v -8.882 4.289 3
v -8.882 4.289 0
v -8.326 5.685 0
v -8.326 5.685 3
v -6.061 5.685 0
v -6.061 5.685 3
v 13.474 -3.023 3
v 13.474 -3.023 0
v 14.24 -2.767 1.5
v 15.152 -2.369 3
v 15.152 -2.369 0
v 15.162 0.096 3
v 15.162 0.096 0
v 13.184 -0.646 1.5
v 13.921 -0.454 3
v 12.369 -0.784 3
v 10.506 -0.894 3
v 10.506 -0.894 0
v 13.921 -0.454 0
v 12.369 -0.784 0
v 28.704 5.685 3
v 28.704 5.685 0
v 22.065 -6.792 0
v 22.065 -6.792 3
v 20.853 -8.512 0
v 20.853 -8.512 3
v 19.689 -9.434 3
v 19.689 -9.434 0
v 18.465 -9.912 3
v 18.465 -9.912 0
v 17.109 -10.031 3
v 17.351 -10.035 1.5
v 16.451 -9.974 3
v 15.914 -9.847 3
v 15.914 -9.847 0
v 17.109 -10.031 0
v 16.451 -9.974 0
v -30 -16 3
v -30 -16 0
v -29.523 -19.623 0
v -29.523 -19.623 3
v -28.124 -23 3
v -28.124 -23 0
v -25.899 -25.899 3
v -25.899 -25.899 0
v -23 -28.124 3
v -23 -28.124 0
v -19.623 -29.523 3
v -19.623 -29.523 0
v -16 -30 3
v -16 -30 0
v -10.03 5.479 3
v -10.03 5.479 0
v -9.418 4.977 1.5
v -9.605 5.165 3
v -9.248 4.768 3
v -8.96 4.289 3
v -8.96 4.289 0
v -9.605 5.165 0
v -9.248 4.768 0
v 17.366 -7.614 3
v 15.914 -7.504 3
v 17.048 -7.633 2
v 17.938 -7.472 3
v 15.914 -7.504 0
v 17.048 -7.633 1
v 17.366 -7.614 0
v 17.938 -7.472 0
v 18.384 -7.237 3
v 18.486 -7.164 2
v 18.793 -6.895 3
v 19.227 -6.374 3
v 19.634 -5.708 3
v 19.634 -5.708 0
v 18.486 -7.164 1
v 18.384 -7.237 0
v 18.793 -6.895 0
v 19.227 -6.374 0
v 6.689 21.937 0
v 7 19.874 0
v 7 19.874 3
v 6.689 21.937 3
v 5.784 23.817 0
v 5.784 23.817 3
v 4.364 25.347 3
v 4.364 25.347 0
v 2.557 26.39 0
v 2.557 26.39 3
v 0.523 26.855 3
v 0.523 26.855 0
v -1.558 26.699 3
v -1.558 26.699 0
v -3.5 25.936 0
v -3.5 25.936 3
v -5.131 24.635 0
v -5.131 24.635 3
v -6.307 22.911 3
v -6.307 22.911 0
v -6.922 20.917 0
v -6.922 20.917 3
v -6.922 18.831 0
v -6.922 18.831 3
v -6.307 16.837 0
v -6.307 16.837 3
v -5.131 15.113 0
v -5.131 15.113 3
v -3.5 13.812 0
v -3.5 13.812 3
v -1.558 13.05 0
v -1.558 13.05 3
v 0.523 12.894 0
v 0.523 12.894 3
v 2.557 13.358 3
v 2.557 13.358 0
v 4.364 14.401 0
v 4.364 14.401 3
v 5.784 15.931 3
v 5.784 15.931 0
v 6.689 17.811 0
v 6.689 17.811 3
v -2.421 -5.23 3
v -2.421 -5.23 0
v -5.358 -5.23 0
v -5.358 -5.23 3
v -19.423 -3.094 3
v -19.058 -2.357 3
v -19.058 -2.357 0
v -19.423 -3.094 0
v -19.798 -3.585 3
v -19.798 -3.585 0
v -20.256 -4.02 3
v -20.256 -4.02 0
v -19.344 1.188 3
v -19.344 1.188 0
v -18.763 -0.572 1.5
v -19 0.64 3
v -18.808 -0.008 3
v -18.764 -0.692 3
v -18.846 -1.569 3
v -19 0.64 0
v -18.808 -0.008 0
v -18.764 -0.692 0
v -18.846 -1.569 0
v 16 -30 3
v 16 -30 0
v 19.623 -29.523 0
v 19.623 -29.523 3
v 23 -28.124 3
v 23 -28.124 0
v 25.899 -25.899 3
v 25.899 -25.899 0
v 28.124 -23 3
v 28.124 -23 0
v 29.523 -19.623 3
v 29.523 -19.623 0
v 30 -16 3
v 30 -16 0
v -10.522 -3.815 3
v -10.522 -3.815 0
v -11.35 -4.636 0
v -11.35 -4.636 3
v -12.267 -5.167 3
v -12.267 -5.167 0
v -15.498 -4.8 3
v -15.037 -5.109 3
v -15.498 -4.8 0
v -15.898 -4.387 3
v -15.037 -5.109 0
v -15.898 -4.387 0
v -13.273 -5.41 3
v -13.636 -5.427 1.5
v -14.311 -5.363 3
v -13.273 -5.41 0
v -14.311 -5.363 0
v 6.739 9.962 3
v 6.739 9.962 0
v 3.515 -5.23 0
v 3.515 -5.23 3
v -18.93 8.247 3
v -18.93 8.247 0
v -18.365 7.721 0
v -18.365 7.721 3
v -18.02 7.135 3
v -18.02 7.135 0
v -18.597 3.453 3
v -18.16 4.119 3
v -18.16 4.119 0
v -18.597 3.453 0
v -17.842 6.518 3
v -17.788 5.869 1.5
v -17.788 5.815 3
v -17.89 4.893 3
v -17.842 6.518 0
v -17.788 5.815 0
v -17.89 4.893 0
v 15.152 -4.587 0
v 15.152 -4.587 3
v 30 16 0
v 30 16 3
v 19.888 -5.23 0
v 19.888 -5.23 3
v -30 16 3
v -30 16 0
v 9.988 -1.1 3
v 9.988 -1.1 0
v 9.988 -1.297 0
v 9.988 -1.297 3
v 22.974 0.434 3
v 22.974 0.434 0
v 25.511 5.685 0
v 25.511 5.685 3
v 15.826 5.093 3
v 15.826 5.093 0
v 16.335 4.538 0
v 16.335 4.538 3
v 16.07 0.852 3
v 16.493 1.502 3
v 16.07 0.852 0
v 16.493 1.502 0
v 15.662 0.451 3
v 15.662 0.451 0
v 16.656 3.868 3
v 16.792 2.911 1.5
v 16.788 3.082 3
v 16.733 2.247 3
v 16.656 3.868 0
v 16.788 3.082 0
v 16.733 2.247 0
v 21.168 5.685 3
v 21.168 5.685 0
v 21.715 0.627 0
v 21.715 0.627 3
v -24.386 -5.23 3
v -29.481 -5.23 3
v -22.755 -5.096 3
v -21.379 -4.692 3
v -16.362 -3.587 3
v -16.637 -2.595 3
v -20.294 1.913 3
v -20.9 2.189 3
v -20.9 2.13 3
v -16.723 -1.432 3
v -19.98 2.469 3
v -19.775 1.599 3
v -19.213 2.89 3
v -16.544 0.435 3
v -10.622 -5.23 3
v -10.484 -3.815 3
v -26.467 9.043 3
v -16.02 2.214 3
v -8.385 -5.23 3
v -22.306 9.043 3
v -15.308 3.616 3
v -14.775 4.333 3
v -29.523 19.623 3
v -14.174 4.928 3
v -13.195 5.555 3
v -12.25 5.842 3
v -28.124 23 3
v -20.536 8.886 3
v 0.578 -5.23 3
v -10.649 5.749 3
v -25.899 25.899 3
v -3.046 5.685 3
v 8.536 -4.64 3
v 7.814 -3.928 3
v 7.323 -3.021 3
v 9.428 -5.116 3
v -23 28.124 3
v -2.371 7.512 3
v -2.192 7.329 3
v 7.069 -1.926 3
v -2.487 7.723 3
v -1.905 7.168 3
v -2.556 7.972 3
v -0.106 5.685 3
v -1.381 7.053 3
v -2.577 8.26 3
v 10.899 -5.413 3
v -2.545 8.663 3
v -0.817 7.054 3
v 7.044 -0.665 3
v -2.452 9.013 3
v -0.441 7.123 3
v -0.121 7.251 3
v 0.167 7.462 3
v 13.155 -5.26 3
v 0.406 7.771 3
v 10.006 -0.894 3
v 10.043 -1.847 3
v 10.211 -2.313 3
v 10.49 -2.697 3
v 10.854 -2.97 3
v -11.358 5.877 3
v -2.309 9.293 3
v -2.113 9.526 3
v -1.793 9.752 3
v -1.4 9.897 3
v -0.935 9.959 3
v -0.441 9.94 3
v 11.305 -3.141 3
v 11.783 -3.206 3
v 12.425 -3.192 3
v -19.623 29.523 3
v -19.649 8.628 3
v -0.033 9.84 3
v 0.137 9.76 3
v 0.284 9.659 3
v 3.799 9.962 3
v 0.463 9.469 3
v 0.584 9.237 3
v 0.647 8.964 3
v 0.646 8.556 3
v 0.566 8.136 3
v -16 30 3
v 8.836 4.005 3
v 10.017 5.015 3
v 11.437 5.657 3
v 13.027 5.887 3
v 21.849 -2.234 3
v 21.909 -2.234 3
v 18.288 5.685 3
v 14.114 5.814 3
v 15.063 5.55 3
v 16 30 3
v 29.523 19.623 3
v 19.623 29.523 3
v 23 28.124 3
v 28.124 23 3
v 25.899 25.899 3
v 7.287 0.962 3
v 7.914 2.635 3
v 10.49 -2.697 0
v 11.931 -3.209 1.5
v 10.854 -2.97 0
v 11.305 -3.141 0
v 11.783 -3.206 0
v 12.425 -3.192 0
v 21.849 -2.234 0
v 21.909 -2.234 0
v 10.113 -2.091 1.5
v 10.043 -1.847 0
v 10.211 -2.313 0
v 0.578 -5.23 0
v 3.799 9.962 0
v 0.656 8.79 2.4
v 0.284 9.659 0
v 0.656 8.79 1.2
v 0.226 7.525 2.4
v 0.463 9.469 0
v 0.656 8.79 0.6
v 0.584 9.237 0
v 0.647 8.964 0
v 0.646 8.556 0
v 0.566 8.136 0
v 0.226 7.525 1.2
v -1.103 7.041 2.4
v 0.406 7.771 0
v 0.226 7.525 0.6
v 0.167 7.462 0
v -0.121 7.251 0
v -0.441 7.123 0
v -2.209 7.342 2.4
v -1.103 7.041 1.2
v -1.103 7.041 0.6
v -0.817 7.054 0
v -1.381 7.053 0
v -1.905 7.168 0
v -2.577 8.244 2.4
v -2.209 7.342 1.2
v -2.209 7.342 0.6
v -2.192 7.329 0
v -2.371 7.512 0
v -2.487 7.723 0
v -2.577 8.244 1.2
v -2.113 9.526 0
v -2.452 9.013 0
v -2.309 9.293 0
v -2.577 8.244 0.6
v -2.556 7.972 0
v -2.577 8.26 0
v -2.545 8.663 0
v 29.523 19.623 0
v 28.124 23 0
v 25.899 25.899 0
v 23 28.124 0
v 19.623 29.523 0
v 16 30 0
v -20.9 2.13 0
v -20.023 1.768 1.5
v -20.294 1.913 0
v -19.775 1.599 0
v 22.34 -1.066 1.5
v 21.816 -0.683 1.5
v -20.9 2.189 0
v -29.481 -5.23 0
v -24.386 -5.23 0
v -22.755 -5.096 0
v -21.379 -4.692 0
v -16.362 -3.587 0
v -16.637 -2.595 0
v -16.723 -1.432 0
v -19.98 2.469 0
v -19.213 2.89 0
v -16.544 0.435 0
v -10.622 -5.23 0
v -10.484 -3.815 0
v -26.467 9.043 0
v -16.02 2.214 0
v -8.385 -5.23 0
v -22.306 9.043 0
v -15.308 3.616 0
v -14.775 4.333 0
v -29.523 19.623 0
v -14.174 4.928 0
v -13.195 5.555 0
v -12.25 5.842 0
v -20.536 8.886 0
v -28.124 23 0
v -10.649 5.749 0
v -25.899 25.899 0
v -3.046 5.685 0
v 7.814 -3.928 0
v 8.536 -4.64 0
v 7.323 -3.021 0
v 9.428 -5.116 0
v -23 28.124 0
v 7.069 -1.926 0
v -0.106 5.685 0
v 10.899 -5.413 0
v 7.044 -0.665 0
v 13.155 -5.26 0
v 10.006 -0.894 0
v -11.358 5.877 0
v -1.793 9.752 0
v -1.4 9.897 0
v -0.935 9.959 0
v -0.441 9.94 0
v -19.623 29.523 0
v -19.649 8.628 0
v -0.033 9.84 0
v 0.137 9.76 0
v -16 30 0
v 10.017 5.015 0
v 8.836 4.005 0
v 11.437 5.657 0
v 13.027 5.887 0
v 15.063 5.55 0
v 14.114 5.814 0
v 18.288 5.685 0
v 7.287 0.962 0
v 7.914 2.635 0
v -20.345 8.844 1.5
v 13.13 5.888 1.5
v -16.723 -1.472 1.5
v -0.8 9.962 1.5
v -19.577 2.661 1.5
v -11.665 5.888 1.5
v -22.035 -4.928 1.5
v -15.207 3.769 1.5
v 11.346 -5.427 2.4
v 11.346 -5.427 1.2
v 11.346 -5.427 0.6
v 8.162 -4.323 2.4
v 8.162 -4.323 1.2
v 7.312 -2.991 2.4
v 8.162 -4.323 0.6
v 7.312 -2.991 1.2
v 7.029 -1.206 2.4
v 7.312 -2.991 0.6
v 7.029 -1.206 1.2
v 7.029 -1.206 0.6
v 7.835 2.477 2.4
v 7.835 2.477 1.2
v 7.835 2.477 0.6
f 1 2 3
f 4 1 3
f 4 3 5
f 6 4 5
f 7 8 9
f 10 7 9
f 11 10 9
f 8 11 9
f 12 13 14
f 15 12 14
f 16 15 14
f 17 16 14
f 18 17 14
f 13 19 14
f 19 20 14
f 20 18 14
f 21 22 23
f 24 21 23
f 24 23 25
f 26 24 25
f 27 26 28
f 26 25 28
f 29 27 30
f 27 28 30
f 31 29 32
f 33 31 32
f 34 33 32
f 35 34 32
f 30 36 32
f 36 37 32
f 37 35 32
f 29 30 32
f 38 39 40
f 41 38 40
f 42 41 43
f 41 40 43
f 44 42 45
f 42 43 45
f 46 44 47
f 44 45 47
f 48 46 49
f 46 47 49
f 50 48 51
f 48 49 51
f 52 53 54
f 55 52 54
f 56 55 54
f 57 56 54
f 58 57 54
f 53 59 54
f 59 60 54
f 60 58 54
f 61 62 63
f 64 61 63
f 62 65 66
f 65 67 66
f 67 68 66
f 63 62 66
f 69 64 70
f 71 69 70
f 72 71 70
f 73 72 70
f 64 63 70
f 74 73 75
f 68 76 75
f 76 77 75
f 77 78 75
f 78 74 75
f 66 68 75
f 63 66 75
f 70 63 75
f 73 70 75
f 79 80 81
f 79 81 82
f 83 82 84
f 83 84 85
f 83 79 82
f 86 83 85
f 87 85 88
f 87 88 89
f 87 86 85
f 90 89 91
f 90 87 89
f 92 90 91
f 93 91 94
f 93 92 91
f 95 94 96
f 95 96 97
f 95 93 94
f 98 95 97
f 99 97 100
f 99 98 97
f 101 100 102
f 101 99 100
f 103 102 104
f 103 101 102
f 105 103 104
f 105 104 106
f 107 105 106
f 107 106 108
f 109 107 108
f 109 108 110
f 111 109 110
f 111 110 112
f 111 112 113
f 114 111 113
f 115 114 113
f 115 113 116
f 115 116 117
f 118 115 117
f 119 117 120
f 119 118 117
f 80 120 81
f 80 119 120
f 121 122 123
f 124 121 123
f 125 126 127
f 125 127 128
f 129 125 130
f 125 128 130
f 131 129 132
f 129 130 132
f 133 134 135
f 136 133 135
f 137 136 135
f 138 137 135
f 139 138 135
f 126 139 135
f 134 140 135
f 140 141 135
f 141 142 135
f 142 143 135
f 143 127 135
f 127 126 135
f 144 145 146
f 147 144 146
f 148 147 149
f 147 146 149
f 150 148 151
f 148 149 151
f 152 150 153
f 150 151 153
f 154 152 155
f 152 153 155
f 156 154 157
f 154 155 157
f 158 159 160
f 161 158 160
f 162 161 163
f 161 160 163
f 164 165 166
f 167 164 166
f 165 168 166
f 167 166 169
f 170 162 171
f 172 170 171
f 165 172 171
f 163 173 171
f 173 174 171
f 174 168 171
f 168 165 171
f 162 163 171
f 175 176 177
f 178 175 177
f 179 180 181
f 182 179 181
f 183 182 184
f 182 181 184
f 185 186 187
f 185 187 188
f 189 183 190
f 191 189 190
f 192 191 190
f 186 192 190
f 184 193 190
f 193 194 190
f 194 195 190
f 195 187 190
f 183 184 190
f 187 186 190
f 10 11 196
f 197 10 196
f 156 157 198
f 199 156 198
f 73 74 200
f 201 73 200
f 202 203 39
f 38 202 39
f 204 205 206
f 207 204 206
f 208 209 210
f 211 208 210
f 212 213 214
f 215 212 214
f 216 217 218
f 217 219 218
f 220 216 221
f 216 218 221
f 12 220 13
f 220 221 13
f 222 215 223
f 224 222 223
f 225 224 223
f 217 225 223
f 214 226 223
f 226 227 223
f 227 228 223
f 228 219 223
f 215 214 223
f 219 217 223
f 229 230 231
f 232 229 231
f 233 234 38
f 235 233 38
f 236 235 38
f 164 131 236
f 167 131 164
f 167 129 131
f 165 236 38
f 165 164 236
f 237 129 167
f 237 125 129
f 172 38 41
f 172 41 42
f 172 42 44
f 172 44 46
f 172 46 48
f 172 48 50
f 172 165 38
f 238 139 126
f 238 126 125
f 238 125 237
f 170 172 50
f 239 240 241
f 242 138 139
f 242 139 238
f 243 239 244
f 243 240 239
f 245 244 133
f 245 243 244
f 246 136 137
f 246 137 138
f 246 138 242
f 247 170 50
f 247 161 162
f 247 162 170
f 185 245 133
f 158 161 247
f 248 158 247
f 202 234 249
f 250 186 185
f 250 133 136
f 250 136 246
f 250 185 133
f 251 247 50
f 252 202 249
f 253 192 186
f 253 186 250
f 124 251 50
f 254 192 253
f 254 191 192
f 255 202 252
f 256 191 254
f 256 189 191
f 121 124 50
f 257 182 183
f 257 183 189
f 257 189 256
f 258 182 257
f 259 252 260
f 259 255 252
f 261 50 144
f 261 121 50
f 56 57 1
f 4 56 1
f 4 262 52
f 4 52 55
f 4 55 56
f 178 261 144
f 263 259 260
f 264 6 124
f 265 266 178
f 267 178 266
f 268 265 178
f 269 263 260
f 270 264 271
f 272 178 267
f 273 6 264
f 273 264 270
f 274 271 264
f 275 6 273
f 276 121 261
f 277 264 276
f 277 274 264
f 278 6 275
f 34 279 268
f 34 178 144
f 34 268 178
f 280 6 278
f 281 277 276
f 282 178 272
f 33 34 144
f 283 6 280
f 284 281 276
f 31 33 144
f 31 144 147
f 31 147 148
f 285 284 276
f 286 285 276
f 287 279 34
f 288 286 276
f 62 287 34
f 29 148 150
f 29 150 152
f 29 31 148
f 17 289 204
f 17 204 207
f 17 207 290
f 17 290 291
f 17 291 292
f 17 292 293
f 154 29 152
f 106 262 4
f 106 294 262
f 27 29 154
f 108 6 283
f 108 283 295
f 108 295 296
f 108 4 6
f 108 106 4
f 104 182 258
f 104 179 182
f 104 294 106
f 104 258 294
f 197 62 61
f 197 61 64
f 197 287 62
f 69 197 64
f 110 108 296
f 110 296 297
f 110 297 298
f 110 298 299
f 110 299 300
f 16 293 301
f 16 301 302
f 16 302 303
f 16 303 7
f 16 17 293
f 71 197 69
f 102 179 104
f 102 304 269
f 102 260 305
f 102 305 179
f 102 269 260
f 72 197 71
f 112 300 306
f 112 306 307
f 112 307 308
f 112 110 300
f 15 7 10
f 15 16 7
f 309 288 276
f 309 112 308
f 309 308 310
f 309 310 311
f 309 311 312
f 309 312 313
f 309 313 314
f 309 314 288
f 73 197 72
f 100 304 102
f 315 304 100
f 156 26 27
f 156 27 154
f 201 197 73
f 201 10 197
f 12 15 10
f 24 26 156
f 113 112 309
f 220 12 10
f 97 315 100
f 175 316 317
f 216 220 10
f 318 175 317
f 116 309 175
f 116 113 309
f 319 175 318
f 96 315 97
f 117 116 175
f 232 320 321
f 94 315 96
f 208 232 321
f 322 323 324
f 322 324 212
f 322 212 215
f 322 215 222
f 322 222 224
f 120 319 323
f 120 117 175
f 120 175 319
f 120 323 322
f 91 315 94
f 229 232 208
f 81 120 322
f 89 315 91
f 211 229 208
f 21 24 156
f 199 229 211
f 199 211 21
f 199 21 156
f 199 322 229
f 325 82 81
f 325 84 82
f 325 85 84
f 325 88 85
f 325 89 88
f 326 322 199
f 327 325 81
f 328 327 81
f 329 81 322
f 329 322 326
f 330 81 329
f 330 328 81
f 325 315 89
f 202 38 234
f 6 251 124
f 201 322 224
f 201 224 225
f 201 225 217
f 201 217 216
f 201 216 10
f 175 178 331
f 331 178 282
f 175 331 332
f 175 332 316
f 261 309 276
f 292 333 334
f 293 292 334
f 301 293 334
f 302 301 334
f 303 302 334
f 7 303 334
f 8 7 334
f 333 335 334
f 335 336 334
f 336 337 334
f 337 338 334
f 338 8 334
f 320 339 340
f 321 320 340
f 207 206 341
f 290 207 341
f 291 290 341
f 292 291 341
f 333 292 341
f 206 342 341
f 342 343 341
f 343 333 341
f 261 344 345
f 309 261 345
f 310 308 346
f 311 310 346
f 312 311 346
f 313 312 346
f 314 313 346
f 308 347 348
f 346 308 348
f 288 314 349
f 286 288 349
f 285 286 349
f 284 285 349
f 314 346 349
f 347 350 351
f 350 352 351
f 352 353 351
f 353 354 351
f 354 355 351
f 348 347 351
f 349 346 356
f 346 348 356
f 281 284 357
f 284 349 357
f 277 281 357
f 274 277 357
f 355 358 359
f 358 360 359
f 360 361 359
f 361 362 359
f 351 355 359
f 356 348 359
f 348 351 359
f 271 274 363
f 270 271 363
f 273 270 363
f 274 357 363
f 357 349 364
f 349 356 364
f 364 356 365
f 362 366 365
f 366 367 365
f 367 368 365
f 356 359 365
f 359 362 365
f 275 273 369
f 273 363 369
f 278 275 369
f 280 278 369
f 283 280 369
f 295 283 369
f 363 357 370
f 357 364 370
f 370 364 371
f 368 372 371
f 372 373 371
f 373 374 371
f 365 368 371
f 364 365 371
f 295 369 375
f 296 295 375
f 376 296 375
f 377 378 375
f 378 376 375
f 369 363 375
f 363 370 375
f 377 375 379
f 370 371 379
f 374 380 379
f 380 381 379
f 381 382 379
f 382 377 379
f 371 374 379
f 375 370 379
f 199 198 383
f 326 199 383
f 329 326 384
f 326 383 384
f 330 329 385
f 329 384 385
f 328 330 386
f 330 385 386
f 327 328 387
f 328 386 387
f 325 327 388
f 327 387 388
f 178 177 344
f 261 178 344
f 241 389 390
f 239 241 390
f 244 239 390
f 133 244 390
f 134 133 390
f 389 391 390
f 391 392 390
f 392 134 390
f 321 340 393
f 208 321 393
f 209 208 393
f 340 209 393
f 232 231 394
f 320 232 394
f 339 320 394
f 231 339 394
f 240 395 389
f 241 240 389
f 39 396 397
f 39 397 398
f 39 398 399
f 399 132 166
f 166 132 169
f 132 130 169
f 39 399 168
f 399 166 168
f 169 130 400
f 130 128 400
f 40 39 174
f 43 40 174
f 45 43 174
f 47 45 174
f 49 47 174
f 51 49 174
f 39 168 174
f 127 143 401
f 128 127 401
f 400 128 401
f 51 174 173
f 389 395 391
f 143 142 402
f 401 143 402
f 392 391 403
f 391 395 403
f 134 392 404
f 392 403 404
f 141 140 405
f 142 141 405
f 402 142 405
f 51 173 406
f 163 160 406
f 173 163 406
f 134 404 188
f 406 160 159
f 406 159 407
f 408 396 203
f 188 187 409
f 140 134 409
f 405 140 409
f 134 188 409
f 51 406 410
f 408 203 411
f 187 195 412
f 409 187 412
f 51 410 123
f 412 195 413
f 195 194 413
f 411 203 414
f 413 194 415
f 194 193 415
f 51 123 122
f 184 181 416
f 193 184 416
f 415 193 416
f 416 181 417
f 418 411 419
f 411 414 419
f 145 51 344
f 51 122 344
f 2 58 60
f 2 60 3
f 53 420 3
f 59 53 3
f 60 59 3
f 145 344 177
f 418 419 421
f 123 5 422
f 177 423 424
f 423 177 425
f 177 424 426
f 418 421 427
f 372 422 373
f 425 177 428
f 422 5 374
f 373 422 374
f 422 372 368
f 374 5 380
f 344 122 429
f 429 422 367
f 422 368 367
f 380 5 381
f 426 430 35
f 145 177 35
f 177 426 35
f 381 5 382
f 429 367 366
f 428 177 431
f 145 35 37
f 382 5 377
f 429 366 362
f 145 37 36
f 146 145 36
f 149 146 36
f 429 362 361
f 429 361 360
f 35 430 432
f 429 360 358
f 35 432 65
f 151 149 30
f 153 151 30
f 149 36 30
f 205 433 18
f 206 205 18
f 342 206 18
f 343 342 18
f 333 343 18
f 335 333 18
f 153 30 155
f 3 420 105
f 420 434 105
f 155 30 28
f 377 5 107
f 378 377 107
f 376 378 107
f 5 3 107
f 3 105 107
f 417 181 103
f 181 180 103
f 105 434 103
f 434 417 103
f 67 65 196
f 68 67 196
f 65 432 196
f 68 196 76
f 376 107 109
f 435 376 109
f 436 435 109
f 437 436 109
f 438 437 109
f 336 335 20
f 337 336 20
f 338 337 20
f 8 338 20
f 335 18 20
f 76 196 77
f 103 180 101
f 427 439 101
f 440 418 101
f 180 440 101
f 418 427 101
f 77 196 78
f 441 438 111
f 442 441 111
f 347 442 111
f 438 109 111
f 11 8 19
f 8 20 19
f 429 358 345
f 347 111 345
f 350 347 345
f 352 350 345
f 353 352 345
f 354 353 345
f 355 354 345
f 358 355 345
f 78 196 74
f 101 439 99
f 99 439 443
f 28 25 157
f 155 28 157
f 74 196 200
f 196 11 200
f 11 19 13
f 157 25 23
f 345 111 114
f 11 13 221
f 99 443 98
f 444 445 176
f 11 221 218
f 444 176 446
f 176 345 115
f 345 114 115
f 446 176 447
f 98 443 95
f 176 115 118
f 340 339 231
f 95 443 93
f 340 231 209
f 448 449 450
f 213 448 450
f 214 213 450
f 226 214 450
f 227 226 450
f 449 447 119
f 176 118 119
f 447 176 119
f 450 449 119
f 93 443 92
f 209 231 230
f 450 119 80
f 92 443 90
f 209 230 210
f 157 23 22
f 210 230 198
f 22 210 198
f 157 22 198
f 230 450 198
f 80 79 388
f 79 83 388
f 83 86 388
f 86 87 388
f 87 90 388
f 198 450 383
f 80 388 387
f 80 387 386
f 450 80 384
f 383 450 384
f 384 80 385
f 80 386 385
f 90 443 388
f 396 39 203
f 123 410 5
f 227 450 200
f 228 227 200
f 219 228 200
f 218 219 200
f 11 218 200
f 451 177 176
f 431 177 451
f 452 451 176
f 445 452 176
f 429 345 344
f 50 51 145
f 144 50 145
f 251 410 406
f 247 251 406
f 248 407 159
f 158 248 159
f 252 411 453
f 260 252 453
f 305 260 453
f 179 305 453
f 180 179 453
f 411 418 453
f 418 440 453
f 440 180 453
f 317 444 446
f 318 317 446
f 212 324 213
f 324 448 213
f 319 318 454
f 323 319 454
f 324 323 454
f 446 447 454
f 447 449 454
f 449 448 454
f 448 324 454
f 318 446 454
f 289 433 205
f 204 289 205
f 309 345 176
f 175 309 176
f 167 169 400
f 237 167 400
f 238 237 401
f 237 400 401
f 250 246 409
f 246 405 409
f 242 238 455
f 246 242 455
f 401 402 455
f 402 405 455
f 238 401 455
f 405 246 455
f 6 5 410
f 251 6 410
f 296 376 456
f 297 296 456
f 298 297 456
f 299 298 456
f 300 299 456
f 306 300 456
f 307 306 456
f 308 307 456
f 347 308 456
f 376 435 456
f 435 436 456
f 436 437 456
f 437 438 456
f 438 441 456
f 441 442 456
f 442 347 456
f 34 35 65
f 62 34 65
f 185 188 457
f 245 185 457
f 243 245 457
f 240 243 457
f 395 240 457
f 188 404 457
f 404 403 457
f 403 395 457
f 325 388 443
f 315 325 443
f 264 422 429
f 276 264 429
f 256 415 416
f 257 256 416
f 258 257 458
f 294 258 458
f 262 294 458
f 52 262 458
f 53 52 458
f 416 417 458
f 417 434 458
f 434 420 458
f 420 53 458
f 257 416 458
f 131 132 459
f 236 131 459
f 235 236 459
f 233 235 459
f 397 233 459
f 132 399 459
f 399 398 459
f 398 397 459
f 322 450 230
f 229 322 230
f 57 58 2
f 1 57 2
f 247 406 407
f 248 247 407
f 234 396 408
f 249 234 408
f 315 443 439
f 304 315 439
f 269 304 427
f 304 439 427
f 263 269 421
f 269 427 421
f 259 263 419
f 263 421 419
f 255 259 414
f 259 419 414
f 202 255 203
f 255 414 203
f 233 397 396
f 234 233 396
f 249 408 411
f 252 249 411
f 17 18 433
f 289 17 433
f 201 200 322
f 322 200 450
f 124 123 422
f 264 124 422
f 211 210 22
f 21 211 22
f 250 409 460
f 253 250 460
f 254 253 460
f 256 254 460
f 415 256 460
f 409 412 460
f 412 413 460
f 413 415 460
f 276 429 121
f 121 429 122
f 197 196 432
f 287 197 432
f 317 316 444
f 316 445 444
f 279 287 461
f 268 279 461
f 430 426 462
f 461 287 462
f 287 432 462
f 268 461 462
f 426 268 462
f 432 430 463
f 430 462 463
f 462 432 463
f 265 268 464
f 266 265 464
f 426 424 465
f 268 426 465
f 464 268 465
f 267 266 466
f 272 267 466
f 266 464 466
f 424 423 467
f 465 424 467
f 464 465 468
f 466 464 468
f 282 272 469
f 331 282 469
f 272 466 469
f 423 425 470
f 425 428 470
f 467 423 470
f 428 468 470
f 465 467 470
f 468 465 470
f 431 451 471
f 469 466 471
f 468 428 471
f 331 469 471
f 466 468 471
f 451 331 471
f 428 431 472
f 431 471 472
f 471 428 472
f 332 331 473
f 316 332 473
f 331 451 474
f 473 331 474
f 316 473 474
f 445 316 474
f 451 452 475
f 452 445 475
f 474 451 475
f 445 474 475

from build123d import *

# Parameters (mm, degrees)
F0_R     = 7
F1_DEPTH = 3


with BuildPart() as f1:
    # F0 (on Top) → F1 (new body)
    with BuildSketch(Plane.XY):
        with BuildLine():
            ThreePointArc((30, 16), (25.8994949366, 25.8994949366), (16, 30))
            Line((16, 30), (-16, 30))
            ThreePointArc((-16, 30), (-25.8994949366, 25.8994949366), (-30, 16))
            Line((-30, 16), (-30, -16))
            ThreePointArc((-30, -16), (-25.8994949366, -25.8994949366), (-16, -30))
            Line((-16, -30), (16, -30))
            ThreePointArc((16, -30), (25.8994949366, -25.8994949366), (30, -16))
            Line((30, -16), (30, 16))
        make_face()
        with BuildLine():
            Line((19.8875351453, -5.2301914546), (18.2880349891, 5.685147502))
            Line((18.2880349891, 5.685147502), (21.1683848797, 5.685147502))
            Line((21.1683848797, 5.685147502), (21.7150890347, 0.6273530628))
            add(Edge.make_bspline(
                [(21.7150890347, 0.6273530628), (21.8494220556, -0.5628999831), (21.8494220556, -2.2342526854)],
                knots=[0, 0, 0, 1, 1, 1], degree=2))
            Line((21.8494220556, -2.2342526854), (21.9087785067, -2.2342526854))
            add(Edge.make_bspline(
                [(21.9087785067, -2.2342526854), (22.1055920025, -1.7344088866), (22.3398937832, -1.0658678057)],
                knots=[0, 0, 0, 1, 1, 1], degree=2))
            add(Edge.make_bspline(
                [(22.3398937832, -1.0658678057), (22.5741955639, -0.3973267248), (22.9740706029, 0.4336635907)],
                knots=[0, 0, 0, 1, 1, 1], degree=2))
            Line((22.9740706029, 0.4336635907), (25.5107778819, 5.685147502))
            Line((25.5107778819, 5.685147502), (28.7035301468, 5.685147502))
            Line((28.7035301468, 5.685147502), (22.0649796938, -6.7922033259))
            add(Edge.make_bspline(
                [(22.0649796938, -6.7922033259), (20.3373945642, -10.0349399707), (17.3508278663, -10.0349399707)],
                knots=[0, 0, 0, 1, 1, 1], degree=2))
            add(Edge.make_bspline(
                [(17.3508278663, -10.0349399707), (16.4698531709, -10.0349399707), (15.9137769447, -9.8474985461)],
                knots=[0, 0, 0, 1, 1, 1], degree=2))
            Line((15.9137769447, -9.8474985461), (15.9137769447, -7.5044807392))
            add(Edge.make_bspline(
                [(15.9137769447, -7.5044807392), (16.5791940019, -7.6325657126), (17.0477975633, -7.6325657126)],
                knots=[0, 0, 0, 1, 1, 1], degree=2))
            add(Edge.make_bspline(
                [(17.0477975633, -7.6325657126), (17.8662917838, -7.6325657126), (18.4864104967, -7.1639621512)],
                knots=[0, 0, 0, 1, 1, 1], degree=2))
            add(Edge.make_bspline(
                [(18.4864104967, -7.1639621512), (19.1065292096, -6.6953585898), (19.6344892221, -5.7081670872)],
                knots=[0, 0, 0, 1, 1, 1], degree=2))
            Line((19.6344892221, -5.7081670872), (19.8875351453, -5.2301914546))
        make_face(mode=Mode.SUBTRACT)
        with BuildLine():
            Line((-26.4667291471, 9.0434730253), (-22.305529522, 9.0434730253))
            add(Edge.make_bspline(
                [(-22.305529522, 9.0434730253), (-20.0718525461, 9.0434730253), (-18.9300218682, 8.2468469709)],
                knots=[0, 0, 0, 1, 1, 1], degree=2))
            add(Edge.make_bspline(
                [(-18.9300218682, 8.2468469709), (-17.7881911903, 7.4502209166), (-17.7881911903, 5.8694649028)],
                knots=[0, 0, 0, 1, 1, 1], degree=2))
            add(Edge.make_bspline(
                [(-17.7881911903, 5.8694649028), (-17.7881911903, 4.4042977676), (-18.5973133396, 3.4530325379)],
                knots=[0, 0, 0, 1, 1, 1], degree=2))
            add(Edge.make_bspline(
                [(-18.5973133396, 3.4530325379), (-19.4064354889, 2.5017673083), (-20.8997188379, 2.1893649341)],
                knots=[0, 0, 0, 1, 1, 1], degree=2))
            Line((-20.8997188379, 2.1893649341), (-20.8997188379, 2.130008483))
            add(Edge.make_bspline(
                [(-20.8997188379, 2.130008483), (-19.9250234302, 1.8769625598), (-19.3439550141, 1.1881153246)],
                knots=[0, 0, 0, 1, 1, 1], degree=2))
            add(Edge.make_bspline(
                [(-19.3439550141, 1.1881153246), (-18.7628865979, 0.4992680893), (-18.7628865979, -0.5722720544)],
                knots=[0, 0, 0, 1, 1, 1], degree=2))
            add(Edge.make_bspline(
                [(-18.7628865979, -0.5722720544), (-18.7628865979, -2.8090730541), (-20.2561699469, -4.0196322543)],
                knots=[0, 0, 0, 1, 1, 1], degree=2))
            add(Edge.make_bspline(
                [(-20.2561699469, -4.0196322543), (-21.7494532958, -5.2301914546), (-24.3861293346, -5.2301914546)],
                knots=[0, 0, 0, 1, 1, 1], degree=2))
            Line((-24.3861293346, -5.2301914546), (-29.4814120587, -5.2301914546))
            Line((-29.4814120587, -5.2301914546), (-26.4667291471, 9.0434730253))
        make_face(mode=Mode.SUBTRACT)
        with BuildLine():
            add(Edge.make_bspline(
                [(-10.521711965, -3.8150086992), (-11.8306779132, -5.4270049503), (-13.6363636364, -5.4270049503)],
                knots=[0, 0, 0, 1, 1, 1], degree=2))
            add(Edge.make_bspline(
                [(-13.6363636364, -5.4270049503), (-15.073414558, -5.4270049503), (-15.898156826, -4.3867050441)],
                knots=[0, 0, 0, 1, 1, 1], degree=2))
            add(Edge.make_bspline(
                [(-15.898156826, -4.3867050441), (-16.722899094, -3.3464051378), (-16.722899094, -1.4719908922)],
                knots=[0, 0, 0, 1, 1, 1], degree=2))
            add(Edge.make_bspline(
                [(-16.722899094, -1.4719908922), (-16.722899094, 0.4617798044), (-16.019993752, 2.214357124)],
                knots=[0, 0, 0, 1, 1, 1], degree=2))
            add(Edge.make_bspline(
                [(-16.019993752, 2.214357124), (-15.3170884099, 3.9669344436), (-14.1736957201, 4.9275717444)],
                knots=[0, 0, 0, 1, 1, 1], degree=2))
            add(Edge.make_bspline(
                [(-14.1736957201, 4.9275717444), (-13.0303030303, 5.8882090453), (-11.6651046548, 5.8882090453)],
                knots=[0, 0, 0, 1, 1, 1], degree=2))
            add(Edge.make_bspline(
                [(-11.6651046548, 5.8882090453), (-10.7185254608, 5.8882090453), (-10.0296782256, 5.478961935)],
                knots=[0, 0, 0, 1, 1, 1], degree=2))
            add(Edge.make_bspline(
                [(-10.0296782256, 5.478961935), (-9.3408309903, 5.0697148247), (-8.9597000937, 4.2887088891)],
                knots=[0, 0, 0, 1, 1, 1], degree=2))
            Line((-8.9597000937, 4.2887088891), (-8.8815995002, 4.2887088891))
            Line((-8.8815995002, 4.2887088891), (-8.325523274, 5.685147502))
            Line((-8.325523274, 5.685147502), (-6.0606060606, 5.685147502))
            Line((-6.0606060606, 5.685147502), (-8.3848797251, -5.2301914546))
            Line((-8.3848797251, -5.2301914546), (-10.6216807248, -5.2301914546))
            Line((-10.6216807248, -5.2301914546), (-10.4842236801, -3.8150086992))
            Line((-10.4842236801, -3.8150086992), (-10.521711965, -3.8150086992))
        make_face(mode=Mode.SUBTRACT)
        Polygon((-0.1062168072, 5.685147502), (-2.4211184005, -5.2301914546), (-5.3577007185, -5.2301914546), (-3.045923149, 5.685147502), align=None, mode=Mode.SUBTRACT)
        with BuildLine():
            add(Edge.make_bspline(
                [(-1.1027803811, 7.0409738063), (-2.5773195876, 7.0409738063), (-2.5773195876, 8.2437229472)],
                knots=[0, 0, 0, 1, 1, 1], degree=2))
            add(Edge.make_bspline(
                [(-2.5773195876, 8.2437229472), (-2.5773195876, 9.0903333814), (-2.1134020619, 9.5261346935)],
                knots=[0, 0, 0, 1, 1, 1], degree=2))
            add(Edge.make_bspline(
                [(-2.1134020619, 9.5261346935), (-1.6494845361, 9.9619360056), (-0.7997500781, 9.9619360056)],
                knots=[0, 0, 0, 1, 1, 1], degree=2))
            add(Edge.make_bspline(
                [(-0.7997500781, 9.9619360056), (-0.0874726648, 9.9619360056), (0.2842861606, 9.6589057026)],
                knots=[0, 0, 0, 1, 1, 1], degree=2))
            add(Edge.make_bspline(
                [(0.2842861606, 9.6589057026), (0.6560449859, 9.3558753995), (0.6560449859, 8.7904271021)],
                knots=[0, 0, 0, 1, 1, 1], degree=2))
            add(Edge.make_bspline(
                [(0.6560449859, 8.7904271021), (0.6560449859, 8.0094211665), (0.2264917213, 7.5251974864)],
                knots=[0, 0, 0, 1, 1, 1], degree=2))
            add(Edge.make_bspline(
                [(0.2264917213, 7.5251974864), (-0.2030615433, 7.0409738063), (-1.1027803811, 7.0409738063)],
                knots=[0, 0, 0, 1, 1, 1], degree=2))
        make_face(mode=Mode.SUBTRACT)
        Polygon((6.7385192127, 9.9619360056), (3.5145267104, -5.2301914546), (0.5779443924, -5.2301914546), (3.798812871, 9.9619360056), align=None, mode=Mode.SUBTRACT)
        with BuildLine():
            add(Edge.make_bspline(
                [(15.1515151515, -4.5866425636), (13.4739144017, -5.4270049503), (11.3464542331, -5.4270049503)],
                knots=[0, 0, 0, 1, 1, 1], degree=2))
            add(Edge.make_bspline(
                [(11.3464542331, -5.4270049503), (9.2939706342, -5.4270049503), (8.1615120275, -4.3226625573)],
                knots=[0, 0, 0, 1, 1, 1], degree=2))
            add(Edge.make_bspline(
                [(8.1615120275, -4.3226625573), (7.0290534208, -3.2183201643), (7.0290534208, -1.2064488741)],
                knots=[0, 0, 0, 1, 1, 1], degree=2))
            add(Edge.make_bspline(
                [(7.0290534208, -1.2064488741), (7.0290534208, 0.8116704636), (7.8350515464, 2.4767751184)],
                knots=[0, 0, 0, 1, 1, 1], degree=2))
            add(Edge.make_bspline(
                [(7.8350515464, 2.4767751184), (8.641049672, 4.1418797732), (10.0171821306, 5.0150444092)],
                knots=[0, 0, 0, 1, 1, 1], degree=2))
            add(Edge.make_bspline(
                [(10.0171821306, 5.0150444092), (11.3933145892, 5.8882090453), (13.1302717901, 5.8882090453)],
                knots=[0, 0, 0, 1, 1, 1], degree=2))
            add(Edge.make_bspline(
                [(13.1302717901, 5.8882090453), (14.8609809435, 5.8882090453), (15.8263042799, 5.0931450028)],
                knots=[0, 0, 0, 1, 1, 1], degree=2))
            add(Edge.make_bspline(
                [(15.8263042799, 5.0931450028), (16.7916276164, 4.2980809603), (16.7916276164, 2.9110144186)],
                knots=[0, 0, 0, 1, 1, 1], degree=2))
            add(Edge.make_bspline(
                [(16.7916276164, 2.9110144186), (16.7916276164, 1.0865845529), (15.1624492346, 0.0962690265)],
                knots=[0, 0, 0, 1, 1, 1], degree=2))
            add(Edge.make_bspline(
                [(15.1624492346, 0.0962690265), (13.5332708529, -0.8940464999), (10.5060918463, -0.8940464999)],
                knots=[0, 0, 0, 1, 1, 1], degree=2))
            Line((10.5060918463, -0.8940464999), (10.0062480475, -0.8940464999))
            Line((10.0062480475, -0.8940464999), (9.987503905, -1.1002320669))
            Line((9.987503905, -1.1002320669), (9.987503905, -1.2970455627))
            add(Edge.make_bspline(
                [(9.987503905, -1.2970455627), (9.987503905, -2.1842683055), (10.4904717276, -2.6966081993)],
                knots=[0, 0, 0, 1, 1, 1], degree=2))
            add(Edge.make_bspline(
                [(10.4904717276, -2.6966081993), (10.9934395501, -3.2089480931), (11.9306466729, -3.2089480931)],
                knots=[0, 0, 0, 1, 1, 1], degree=2))
            add(Edge.make_bspline(
                [(11.9306466729, -3.2089480931), (12.7803811309, -3.2089480931), (13.4739144017, -3.0230686804)],
                knots=[0, 0, 0, 1, 1, 1], degree=2))
            add(Edge.make_bspline(
                [(13.4739144017, -3.0230686804), (14.1674476726, -2.8371892677), (15.1515151515, -2.3685857064)],
                knots=[0, 0, 0, 1, 1, 1], degree=2))
            Line((15.1515151515, -2.3685857064), (15.1515151515, -4.5866425636))
        make_face(mode=Mode.SUBTRACT)
        with Locations((0, 19.8741126806)):
            Circle(F0_R, mode=Mode.SUBTRACT)
    extrude(amount=F1_DEPTH)


solid = f1.part
